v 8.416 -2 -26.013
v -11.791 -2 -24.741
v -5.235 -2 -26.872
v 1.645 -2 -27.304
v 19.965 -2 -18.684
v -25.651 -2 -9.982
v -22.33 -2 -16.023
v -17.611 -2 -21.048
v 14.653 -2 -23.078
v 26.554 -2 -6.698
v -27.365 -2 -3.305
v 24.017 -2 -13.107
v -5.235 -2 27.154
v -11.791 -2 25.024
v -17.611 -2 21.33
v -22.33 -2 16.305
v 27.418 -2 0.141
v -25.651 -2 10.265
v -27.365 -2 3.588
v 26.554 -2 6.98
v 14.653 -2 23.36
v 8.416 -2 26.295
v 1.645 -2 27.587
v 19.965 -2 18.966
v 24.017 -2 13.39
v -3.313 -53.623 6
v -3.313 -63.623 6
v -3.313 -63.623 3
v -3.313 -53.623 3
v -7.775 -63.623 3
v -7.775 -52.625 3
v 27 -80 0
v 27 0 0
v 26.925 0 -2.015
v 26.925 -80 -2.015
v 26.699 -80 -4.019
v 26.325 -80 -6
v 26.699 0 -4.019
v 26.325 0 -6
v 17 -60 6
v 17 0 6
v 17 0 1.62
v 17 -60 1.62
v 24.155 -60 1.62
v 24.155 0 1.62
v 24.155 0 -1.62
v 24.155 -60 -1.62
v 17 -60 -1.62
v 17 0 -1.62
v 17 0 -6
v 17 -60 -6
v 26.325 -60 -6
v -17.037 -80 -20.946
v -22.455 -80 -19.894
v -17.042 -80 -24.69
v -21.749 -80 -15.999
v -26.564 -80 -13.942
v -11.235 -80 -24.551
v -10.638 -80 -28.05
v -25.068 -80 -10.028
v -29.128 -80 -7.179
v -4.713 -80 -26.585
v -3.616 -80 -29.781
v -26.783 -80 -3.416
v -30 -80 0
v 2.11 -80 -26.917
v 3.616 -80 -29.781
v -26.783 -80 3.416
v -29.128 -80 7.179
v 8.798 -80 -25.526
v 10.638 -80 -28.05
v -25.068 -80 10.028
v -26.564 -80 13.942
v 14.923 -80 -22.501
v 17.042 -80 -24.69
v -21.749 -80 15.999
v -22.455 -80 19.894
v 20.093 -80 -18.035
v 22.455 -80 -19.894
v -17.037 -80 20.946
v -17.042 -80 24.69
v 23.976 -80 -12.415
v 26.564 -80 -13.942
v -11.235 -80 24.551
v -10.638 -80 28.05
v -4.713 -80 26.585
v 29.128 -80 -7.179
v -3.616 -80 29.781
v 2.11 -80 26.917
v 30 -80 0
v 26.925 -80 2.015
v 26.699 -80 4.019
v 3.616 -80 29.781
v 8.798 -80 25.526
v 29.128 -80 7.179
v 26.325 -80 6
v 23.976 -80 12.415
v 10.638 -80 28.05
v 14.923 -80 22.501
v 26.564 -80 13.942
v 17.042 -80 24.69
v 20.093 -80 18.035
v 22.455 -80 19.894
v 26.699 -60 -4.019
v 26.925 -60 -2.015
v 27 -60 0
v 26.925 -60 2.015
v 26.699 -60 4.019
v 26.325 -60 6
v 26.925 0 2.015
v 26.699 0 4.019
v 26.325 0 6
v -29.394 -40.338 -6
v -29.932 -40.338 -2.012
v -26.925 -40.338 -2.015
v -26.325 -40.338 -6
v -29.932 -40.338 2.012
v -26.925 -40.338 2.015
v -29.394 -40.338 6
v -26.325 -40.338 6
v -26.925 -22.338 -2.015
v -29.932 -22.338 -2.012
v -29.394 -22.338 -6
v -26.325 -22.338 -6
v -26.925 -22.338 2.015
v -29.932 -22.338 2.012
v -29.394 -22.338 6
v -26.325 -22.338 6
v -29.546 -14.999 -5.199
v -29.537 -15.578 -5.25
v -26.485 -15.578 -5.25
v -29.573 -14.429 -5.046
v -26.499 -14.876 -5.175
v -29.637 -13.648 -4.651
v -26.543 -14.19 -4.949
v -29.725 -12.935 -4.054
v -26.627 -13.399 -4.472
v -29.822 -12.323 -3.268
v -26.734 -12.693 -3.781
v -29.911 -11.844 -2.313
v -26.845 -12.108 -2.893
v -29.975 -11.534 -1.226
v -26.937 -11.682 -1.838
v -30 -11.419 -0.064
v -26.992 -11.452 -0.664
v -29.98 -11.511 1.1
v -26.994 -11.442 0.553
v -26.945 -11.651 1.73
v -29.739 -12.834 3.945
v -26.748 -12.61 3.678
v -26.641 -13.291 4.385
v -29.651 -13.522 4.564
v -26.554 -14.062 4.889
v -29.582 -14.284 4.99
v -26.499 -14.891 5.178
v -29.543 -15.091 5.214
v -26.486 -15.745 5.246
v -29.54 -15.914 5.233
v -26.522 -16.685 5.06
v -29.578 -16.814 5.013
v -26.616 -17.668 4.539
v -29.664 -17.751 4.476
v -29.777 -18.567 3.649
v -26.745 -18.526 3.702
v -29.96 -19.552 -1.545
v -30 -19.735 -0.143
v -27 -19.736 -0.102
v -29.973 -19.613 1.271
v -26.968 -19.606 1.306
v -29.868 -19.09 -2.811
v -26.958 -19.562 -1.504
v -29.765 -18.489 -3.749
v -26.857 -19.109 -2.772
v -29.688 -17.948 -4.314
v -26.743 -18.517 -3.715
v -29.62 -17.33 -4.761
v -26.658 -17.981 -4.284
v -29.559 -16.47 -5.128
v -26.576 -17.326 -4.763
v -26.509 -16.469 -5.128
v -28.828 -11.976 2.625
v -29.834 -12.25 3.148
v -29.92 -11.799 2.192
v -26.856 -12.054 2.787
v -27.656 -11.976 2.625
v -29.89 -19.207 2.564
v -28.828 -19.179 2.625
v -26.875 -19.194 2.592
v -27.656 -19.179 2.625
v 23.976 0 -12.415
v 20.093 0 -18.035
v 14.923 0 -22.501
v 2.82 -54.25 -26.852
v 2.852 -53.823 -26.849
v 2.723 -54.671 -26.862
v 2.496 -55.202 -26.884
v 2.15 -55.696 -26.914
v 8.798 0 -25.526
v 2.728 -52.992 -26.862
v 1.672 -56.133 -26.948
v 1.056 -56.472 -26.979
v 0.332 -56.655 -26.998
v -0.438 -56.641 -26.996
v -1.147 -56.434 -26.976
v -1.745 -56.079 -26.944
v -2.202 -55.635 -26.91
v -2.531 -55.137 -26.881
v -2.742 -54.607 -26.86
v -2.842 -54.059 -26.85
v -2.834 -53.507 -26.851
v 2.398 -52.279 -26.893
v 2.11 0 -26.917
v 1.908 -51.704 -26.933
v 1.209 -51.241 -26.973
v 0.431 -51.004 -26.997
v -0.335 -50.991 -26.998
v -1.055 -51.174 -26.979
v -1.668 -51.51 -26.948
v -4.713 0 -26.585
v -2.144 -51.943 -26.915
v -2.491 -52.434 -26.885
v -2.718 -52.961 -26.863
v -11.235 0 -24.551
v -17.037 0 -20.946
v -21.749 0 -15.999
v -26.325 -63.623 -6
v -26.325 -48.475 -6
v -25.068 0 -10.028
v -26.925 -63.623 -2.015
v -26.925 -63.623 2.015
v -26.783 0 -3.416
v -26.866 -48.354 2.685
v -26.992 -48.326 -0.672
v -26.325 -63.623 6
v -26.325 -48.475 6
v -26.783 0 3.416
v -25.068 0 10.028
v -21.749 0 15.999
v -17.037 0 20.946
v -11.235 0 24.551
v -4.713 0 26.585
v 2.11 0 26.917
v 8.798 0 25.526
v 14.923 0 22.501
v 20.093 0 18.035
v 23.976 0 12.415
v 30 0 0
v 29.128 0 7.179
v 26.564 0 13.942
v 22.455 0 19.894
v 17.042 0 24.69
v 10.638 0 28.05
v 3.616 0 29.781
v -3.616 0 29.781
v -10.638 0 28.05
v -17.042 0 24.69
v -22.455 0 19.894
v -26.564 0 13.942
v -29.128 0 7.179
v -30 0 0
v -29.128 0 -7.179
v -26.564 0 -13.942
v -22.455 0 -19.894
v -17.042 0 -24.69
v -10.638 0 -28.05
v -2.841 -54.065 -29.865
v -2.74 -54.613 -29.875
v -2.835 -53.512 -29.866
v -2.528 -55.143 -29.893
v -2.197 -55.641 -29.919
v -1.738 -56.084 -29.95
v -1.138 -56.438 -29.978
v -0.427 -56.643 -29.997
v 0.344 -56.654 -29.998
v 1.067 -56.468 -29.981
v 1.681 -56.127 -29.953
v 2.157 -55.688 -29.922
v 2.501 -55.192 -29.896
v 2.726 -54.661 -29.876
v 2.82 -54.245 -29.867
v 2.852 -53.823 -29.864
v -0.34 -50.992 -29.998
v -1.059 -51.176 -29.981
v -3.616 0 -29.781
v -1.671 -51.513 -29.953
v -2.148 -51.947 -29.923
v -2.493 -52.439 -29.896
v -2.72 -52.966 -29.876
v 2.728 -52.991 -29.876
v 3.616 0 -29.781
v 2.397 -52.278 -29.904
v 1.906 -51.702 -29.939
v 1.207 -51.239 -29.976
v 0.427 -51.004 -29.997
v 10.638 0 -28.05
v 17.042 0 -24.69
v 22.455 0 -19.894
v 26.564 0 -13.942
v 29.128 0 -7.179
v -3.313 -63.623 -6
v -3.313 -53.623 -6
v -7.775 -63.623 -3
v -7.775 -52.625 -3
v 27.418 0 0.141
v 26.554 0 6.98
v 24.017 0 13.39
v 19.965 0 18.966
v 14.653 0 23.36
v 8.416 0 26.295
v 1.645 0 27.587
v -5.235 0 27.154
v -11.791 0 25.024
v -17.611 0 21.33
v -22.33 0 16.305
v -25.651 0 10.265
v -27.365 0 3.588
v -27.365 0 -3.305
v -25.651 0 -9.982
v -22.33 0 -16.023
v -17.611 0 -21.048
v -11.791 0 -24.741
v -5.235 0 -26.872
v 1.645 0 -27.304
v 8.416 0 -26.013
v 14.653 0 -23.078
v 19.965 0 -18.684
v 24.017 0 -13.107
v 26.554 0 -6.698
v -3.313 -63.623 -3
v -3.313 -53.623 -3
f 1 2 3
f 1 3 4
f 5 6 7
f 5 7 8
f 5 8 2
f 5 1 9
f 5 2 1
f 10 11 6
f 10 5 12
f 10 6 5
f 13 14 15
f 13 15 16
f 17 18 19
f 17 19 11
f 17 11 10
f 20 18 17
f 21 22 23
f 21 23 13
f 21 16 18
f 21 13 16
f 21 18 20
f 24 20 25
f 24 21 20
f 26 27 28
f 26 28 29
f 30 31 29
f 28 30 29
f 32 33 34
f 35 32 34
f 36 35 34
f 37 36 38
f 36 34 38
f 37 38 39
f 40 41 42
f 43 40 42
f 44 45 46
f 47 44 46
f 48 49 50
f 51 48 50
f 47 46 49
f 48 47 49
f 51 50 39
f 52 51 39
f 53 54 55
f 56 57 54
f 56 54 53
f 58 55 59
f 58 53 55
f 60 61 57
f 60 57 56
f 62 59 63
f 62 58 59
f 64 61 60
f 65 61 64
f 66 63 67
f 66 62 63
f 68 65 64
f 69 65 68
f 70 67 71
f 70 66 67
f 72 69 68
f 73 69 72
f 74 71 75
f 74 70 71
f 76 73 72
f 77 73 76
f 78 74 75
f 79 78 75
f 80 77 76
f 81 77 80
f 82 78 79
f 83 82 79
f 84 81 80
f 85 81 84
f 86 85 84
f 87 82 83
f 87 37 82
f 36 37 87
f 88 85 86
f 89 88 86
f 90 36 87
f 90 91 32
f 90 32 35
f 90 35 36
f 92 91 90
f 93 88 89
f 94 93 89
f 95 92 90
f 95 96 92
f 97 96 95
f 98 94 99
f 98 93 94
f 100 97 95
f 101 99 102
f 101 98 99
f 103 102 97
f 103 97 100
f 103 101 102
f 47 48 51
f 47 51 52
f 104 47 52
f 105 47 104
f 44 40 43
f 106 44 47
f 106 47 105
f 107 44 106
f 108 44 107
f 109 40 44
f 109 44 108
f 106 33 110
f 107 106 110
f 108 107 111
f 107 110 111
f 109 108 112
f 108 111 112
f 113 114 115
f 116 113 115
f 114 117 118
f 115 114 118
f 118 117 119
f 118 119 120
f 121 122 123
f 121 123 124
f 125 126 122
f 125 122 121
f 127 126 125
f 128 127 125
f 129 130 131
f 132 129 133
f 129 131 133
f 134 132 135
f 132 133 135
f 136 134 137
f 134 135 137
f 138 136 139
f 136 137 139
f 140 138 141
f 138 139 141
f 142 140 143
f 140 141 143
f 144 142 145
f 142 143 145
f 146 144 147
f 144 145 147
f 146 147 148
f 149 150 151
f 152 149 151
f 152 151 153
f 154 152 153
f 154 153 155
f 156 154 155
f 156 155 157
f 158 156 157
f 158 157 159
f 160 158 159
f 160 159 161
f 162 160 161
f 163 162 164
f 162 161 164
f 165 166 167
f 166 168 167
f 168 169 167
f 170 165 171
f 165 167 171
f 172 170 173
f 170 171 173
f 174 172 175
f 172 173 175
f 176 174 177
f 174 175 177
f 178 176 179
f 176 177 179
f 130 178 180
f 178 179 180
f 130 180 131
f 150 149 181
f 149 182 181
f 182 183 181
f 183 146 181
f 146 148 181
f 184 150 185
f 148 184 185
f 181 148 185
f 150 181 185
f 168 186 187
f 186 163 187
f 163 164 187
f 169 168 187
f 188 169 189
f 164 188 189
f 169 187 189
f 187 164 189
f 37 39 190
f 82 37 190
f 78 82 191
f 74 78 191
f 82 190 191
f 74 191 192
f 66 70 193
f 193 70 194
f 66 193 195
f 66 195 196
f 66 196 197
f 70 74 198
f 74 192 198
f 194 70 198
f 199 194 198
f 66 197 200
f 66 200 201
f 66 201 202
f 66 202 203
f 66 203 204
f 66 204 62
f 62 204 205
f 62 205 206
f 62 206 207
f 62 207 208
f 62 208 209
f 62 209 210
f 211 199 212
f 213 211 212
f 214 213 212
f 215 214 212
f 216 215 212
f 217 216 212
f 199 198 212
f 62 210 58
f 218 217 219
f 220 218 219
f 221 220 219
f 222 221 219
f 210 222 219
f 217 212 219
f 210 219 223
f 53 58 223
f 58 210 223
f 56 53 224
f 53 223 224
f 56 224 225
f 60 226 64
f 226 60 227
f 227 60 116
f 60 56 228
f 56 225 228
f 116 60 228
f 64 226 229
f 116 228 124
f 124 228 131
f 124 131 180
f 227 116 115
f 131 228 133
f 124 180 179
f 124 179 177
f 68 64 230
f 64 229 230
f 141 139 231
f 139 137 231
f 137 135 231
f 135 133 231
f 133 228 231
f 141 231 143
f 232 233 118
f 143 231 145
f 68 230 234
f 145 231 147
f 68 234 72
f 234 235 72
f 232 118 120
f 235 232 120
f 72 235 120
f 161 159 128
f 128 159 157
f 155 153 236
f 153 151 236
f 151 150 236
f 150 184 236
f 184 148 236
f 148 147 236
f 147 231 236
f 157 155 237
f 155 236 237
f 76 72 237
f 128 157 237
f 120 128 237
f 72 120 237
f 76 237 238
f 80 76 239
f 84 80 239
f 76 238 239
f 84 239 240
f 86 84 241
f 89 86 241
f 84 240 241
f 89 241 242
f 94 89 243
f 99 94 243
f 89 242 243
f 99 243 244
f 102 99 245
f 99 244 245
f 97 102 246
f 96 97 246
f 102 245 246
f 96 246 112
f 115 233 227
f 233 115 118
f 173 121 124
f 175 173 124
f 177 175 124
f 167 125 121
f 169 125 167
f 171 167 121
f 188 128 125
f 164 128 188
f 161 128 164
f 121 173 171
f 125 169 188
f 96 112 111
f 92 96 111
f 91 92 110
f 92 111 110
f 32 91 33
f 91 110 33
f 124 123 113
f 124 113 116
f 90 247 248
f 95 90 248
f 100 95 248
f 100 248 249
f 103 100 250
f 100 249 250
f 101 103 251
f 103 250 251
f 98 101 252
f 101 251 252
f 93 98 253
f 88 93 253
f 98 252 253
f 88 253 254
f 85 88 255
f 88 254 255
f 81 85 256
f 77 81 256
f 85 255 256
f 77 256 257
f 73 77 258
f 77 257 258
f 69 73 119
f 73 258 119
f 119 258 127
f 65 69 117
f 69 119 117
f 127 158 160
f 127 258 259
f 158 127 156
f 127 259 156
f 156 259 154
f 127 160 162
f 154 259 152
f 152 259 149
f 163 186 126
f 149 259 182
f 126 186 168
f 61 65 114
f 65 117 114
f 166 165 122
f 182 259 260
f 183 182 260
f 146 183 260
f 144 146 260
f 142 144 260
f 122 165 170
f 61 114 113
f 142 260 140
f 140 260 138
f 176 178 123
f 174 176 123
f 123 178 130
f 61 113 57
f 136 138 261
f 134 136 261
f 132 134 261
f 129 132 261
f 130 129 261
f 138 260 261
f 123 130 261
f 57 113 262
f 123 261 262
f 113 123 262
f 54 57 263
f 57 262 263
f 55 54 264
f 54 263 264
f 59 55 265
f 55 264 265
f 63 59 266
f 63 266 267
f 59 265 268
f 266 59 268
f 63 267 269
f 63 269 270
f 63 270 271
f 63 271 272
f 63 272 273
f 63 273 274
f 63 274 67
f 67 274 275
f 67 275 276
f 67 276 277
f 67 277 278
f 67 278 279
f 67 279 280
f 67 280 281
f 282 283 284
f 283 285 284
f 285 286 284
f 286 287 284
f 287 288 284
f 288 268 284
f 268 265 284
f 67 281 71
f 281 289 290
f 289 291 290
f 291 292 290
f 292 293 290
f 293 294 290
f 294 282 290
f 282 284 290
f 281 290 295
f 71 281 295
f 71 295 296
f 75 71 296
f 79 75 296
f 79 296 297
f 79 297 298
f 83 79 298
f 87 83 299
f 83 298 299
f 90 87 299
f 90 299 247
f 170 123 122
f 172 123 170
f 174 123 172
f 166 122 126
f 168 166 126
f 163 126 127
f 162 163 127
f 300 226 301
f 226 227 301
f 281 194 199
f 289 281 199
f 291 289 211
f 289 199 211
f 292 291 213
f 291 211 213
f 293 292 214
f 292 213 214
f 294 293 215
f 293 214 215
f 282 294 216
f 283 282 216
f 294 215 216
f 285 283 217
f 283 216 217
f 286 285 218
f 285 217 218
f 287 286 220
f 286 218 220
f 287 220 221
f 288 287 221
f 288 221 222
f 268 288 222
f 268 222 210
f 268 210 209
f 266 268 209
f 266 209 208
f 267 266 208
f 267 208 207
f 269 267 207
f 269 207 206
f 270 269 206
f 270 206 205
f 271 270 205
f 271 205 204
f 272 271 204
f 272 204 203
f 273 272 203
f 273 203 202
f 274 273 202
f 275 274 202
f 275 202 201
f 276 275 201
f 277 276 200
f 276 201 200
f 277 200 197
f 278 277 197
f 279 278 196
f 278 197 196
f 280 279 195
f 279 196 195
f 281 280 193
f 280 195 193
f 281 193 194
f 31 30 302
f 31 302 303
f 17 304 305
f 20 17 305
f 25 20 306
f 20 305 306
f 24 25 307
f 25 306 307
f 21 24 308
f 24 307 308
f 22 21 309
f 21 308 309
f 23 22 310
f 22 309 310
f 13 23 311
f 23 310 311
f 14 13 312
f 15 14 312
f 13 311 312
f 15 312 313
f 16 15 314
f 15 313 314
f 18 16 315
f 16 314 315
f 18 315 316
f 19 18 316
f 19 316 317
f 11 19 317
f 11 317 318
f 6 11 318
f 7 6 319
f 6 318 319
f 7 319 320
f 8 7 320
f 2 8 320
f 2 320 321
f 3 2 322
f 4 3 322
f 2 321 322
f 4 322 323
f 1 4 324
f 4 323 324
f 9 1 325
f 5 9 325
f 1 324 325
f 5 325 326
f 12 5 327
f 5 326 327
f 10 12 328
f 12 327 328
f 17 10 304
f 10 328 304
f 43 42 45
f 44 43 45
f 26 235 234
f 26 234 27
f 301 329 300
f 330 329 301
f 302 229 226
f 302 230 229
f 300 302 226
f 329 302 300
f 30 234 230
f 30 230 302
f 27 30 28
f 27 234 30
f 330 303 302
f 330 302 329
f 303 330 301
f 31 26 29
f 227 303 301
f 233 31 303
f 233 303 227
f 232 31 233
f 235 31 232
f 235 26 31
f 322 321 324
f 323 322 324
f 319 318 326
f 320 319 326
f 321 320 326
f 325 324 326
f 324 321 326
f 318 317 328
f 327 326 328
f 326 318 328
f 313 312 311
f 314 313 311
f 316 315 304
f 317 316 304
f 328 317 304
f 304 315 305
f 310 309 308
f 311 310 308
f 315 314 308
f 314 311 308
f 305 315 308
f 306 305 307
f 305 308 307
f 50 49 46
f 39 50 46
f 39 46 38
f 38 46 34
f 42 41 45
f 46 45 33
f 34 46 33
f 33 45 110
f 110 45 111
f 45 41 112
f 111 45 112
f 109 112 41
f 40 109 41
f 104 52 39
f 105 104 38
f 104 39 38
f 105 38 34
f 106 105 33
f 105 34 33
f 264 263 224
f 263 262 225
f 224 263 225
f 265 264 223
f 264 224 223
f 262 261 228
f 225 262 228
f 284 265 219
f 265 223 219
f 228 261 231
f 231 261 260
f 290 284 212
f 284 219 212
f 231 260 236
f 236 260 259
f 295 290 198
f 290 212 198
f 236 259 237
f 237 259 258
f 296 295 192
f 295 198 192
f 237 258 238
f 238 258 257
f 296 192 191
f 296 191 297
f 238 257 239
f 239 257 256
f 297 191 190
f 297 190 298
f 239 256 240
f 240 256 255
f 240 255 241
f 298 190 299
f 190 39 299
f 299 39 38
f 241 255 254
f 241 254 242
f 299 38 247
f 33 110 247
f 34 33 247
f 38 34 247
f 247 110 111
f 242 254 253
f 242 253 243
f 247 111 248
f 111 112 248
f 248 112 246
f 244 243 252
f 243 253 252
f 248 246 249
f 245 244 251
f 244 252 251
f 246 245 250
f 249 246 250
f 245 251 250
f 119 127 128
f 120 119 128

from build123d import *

# Parameters (mm, degrees)
F0_R      = 30
F1_DEPTH  = 80
F2_R      = 27.5
F3_DEPTH  = 2
F4_W      = 13.5446311965
F4_H      = 18
F5_DEPTH  = 6
F6_R      = 2.851632841
F7_DEPTH  = 34.4
F9_DEPTH  = 6
F8_W      = 24
F8_H      = 10
F10_DEPTH = 6
F11_W     = 5.1813843587
F11_H     = 18
F12_DEPTH = 3
F13_DEPTH = 60
F15_DEPTH = 50


# Not quite as in the source:
# - a feature names something its author has since deleted; it is built from what else it names


with BuildPart() as f1:
    # F0 (on Front) → F1 (new body)
    with BuildSketch(Plane.XZ):
        Circle(F0_R)
        with BuildLine():
            ThreePointArc((26.3248931622, 6), (26.8306924564, 3.0189306568), (27, 0))
            ThreePointArc((27, 0), (26.8306924564, -3.0189306568), (26.3248931622, -6))
            ThreePointArc((26.3248931622, -6), (-27, 0), (26.3248931622, 6))
        make_face(mode=Mode.SUBTRACT)
    extrude(amount=F1_DEPTH)

    # F4 (on Top) → F5 (cut, symmetric)
    with BuildSketch(Plane.XY):
        with Locations((-25.5865128711, -31.3380542621)):
            Rectangle(F4_W, F4_H)
    extrude(amount=F5_DEPTH, both=True, mode=Mode.SUBTRACT)

    # F6 (on Top) → F7 (cut)
    with BuildSketch(Plane.XY):
        with Locations((0, -53.8231134415)):
            Circle(F6_R)
    extrude(amount=-F7_DEPTH, mode=Mode.SUBTRACT)

    # F8 (on Top) → F9 (join, symmetric)
    with BuildSketch(Plane.XY):
        Polygon((-27.3131299764, -53.6233463883), (-3.3131299764, -53.6233463883), (-27.464909479, -48.2202917337), align=None)
    extrude(amount=F9_DEPTH, both=True)

    # F8 (on Top) → F10 (join, symmetric)
    with BuildSketch(Plane.XY):
        with Locations((-15.3131299764, -58.6233463883)):
            Rectangle(F8_W, F8_H)
    extrude(amount=F10_DEPTH, both=True)

    # F11 (on Top) → F12 (cut, symmetric)
    with BuildSketch(Plane.XY):
        with Locations((-5.1839929656, -58.0122377723)):
            Rectangle(F11_W, F11_H)
    extrude(amount=F12_DEPTH, both=True, mode=Mode.SUBTRACT)

    # F14 (on Right) → F15 (cut)
    with BuildSketch(Plane.YZ):
        with BuildLine():
            add(Edge.make_bspline(
                [(-15.5778108165, -5.2500003949), (-8.3745810525, -5.2500003949), (-11.9761959345, 2.6250001974), (-15.5778108165, 10.5000007898), (-19.1794256985, 2.6250001974), (-22.7810405805, -5.2500003949), (-15.5778108165, -5.2500003949)],
                knots=[0, 0, 0, 2.0943951024, 2.0943951024, 4.1887902048, 4.1887902048, 6.2831853072, 6.2831853072, 6.2831853072], degree=2, weights=[1, 0.5, 1, 0.5, 1, 0.5, 1]))
        make_face()
    extrude(amount=-F15_DEPTH, mode=Mode.SUBTRACT)


with BuildPart() as f3:
    # F2 (on Front) → F3 (new body)
    with BuildSketch(Plane.XZ):
        with Locations((-0.0819229608, 0.1413219288)):
            Circle(F2_R)
    extrude(amount=F3_DEPTH)


with BuildPart() as f13:
    # F0 (on Front) → F13 (new body)
    with BuildSketch(Plane.XZ):
        with BuildLine():
            Line((24.1553578526, 0), (27, 0))
            ThreePointArc((27, 0), (26.8306924564, 3.0189306568), (26.3248931622, 6))
            Line((26.3248931622, 6), (17, 6))
            Line((17, 6), (17, 1.6203357372))
            Line((17, 1.6203357372), (24.1553578526, 1.6203357372))
            Line((24.1553578526, 1.6203357372), (24.1553578526, 0))
        make_face()
        with BuildLine():
            ThreePointArc((26.3248931622, -6), (26.8306924564, -3.0189306568), (27, 0))
            Line((27, 0), (24.1553578526, 0))
            Line((24.1553578526, 0), (24.1553578526, -1.6203357372))
            Line((24.1553578526, -1.6203357372), (17, -1.6203357372))
            Line((17, -1.6203357372), (17, -6))
            Line((17, -6), (26.3248931622, -6))
        make_face()
    extrude(amount=F13_DEPTH)


solid = Compound([f1.part, f3.part, f13.part])
